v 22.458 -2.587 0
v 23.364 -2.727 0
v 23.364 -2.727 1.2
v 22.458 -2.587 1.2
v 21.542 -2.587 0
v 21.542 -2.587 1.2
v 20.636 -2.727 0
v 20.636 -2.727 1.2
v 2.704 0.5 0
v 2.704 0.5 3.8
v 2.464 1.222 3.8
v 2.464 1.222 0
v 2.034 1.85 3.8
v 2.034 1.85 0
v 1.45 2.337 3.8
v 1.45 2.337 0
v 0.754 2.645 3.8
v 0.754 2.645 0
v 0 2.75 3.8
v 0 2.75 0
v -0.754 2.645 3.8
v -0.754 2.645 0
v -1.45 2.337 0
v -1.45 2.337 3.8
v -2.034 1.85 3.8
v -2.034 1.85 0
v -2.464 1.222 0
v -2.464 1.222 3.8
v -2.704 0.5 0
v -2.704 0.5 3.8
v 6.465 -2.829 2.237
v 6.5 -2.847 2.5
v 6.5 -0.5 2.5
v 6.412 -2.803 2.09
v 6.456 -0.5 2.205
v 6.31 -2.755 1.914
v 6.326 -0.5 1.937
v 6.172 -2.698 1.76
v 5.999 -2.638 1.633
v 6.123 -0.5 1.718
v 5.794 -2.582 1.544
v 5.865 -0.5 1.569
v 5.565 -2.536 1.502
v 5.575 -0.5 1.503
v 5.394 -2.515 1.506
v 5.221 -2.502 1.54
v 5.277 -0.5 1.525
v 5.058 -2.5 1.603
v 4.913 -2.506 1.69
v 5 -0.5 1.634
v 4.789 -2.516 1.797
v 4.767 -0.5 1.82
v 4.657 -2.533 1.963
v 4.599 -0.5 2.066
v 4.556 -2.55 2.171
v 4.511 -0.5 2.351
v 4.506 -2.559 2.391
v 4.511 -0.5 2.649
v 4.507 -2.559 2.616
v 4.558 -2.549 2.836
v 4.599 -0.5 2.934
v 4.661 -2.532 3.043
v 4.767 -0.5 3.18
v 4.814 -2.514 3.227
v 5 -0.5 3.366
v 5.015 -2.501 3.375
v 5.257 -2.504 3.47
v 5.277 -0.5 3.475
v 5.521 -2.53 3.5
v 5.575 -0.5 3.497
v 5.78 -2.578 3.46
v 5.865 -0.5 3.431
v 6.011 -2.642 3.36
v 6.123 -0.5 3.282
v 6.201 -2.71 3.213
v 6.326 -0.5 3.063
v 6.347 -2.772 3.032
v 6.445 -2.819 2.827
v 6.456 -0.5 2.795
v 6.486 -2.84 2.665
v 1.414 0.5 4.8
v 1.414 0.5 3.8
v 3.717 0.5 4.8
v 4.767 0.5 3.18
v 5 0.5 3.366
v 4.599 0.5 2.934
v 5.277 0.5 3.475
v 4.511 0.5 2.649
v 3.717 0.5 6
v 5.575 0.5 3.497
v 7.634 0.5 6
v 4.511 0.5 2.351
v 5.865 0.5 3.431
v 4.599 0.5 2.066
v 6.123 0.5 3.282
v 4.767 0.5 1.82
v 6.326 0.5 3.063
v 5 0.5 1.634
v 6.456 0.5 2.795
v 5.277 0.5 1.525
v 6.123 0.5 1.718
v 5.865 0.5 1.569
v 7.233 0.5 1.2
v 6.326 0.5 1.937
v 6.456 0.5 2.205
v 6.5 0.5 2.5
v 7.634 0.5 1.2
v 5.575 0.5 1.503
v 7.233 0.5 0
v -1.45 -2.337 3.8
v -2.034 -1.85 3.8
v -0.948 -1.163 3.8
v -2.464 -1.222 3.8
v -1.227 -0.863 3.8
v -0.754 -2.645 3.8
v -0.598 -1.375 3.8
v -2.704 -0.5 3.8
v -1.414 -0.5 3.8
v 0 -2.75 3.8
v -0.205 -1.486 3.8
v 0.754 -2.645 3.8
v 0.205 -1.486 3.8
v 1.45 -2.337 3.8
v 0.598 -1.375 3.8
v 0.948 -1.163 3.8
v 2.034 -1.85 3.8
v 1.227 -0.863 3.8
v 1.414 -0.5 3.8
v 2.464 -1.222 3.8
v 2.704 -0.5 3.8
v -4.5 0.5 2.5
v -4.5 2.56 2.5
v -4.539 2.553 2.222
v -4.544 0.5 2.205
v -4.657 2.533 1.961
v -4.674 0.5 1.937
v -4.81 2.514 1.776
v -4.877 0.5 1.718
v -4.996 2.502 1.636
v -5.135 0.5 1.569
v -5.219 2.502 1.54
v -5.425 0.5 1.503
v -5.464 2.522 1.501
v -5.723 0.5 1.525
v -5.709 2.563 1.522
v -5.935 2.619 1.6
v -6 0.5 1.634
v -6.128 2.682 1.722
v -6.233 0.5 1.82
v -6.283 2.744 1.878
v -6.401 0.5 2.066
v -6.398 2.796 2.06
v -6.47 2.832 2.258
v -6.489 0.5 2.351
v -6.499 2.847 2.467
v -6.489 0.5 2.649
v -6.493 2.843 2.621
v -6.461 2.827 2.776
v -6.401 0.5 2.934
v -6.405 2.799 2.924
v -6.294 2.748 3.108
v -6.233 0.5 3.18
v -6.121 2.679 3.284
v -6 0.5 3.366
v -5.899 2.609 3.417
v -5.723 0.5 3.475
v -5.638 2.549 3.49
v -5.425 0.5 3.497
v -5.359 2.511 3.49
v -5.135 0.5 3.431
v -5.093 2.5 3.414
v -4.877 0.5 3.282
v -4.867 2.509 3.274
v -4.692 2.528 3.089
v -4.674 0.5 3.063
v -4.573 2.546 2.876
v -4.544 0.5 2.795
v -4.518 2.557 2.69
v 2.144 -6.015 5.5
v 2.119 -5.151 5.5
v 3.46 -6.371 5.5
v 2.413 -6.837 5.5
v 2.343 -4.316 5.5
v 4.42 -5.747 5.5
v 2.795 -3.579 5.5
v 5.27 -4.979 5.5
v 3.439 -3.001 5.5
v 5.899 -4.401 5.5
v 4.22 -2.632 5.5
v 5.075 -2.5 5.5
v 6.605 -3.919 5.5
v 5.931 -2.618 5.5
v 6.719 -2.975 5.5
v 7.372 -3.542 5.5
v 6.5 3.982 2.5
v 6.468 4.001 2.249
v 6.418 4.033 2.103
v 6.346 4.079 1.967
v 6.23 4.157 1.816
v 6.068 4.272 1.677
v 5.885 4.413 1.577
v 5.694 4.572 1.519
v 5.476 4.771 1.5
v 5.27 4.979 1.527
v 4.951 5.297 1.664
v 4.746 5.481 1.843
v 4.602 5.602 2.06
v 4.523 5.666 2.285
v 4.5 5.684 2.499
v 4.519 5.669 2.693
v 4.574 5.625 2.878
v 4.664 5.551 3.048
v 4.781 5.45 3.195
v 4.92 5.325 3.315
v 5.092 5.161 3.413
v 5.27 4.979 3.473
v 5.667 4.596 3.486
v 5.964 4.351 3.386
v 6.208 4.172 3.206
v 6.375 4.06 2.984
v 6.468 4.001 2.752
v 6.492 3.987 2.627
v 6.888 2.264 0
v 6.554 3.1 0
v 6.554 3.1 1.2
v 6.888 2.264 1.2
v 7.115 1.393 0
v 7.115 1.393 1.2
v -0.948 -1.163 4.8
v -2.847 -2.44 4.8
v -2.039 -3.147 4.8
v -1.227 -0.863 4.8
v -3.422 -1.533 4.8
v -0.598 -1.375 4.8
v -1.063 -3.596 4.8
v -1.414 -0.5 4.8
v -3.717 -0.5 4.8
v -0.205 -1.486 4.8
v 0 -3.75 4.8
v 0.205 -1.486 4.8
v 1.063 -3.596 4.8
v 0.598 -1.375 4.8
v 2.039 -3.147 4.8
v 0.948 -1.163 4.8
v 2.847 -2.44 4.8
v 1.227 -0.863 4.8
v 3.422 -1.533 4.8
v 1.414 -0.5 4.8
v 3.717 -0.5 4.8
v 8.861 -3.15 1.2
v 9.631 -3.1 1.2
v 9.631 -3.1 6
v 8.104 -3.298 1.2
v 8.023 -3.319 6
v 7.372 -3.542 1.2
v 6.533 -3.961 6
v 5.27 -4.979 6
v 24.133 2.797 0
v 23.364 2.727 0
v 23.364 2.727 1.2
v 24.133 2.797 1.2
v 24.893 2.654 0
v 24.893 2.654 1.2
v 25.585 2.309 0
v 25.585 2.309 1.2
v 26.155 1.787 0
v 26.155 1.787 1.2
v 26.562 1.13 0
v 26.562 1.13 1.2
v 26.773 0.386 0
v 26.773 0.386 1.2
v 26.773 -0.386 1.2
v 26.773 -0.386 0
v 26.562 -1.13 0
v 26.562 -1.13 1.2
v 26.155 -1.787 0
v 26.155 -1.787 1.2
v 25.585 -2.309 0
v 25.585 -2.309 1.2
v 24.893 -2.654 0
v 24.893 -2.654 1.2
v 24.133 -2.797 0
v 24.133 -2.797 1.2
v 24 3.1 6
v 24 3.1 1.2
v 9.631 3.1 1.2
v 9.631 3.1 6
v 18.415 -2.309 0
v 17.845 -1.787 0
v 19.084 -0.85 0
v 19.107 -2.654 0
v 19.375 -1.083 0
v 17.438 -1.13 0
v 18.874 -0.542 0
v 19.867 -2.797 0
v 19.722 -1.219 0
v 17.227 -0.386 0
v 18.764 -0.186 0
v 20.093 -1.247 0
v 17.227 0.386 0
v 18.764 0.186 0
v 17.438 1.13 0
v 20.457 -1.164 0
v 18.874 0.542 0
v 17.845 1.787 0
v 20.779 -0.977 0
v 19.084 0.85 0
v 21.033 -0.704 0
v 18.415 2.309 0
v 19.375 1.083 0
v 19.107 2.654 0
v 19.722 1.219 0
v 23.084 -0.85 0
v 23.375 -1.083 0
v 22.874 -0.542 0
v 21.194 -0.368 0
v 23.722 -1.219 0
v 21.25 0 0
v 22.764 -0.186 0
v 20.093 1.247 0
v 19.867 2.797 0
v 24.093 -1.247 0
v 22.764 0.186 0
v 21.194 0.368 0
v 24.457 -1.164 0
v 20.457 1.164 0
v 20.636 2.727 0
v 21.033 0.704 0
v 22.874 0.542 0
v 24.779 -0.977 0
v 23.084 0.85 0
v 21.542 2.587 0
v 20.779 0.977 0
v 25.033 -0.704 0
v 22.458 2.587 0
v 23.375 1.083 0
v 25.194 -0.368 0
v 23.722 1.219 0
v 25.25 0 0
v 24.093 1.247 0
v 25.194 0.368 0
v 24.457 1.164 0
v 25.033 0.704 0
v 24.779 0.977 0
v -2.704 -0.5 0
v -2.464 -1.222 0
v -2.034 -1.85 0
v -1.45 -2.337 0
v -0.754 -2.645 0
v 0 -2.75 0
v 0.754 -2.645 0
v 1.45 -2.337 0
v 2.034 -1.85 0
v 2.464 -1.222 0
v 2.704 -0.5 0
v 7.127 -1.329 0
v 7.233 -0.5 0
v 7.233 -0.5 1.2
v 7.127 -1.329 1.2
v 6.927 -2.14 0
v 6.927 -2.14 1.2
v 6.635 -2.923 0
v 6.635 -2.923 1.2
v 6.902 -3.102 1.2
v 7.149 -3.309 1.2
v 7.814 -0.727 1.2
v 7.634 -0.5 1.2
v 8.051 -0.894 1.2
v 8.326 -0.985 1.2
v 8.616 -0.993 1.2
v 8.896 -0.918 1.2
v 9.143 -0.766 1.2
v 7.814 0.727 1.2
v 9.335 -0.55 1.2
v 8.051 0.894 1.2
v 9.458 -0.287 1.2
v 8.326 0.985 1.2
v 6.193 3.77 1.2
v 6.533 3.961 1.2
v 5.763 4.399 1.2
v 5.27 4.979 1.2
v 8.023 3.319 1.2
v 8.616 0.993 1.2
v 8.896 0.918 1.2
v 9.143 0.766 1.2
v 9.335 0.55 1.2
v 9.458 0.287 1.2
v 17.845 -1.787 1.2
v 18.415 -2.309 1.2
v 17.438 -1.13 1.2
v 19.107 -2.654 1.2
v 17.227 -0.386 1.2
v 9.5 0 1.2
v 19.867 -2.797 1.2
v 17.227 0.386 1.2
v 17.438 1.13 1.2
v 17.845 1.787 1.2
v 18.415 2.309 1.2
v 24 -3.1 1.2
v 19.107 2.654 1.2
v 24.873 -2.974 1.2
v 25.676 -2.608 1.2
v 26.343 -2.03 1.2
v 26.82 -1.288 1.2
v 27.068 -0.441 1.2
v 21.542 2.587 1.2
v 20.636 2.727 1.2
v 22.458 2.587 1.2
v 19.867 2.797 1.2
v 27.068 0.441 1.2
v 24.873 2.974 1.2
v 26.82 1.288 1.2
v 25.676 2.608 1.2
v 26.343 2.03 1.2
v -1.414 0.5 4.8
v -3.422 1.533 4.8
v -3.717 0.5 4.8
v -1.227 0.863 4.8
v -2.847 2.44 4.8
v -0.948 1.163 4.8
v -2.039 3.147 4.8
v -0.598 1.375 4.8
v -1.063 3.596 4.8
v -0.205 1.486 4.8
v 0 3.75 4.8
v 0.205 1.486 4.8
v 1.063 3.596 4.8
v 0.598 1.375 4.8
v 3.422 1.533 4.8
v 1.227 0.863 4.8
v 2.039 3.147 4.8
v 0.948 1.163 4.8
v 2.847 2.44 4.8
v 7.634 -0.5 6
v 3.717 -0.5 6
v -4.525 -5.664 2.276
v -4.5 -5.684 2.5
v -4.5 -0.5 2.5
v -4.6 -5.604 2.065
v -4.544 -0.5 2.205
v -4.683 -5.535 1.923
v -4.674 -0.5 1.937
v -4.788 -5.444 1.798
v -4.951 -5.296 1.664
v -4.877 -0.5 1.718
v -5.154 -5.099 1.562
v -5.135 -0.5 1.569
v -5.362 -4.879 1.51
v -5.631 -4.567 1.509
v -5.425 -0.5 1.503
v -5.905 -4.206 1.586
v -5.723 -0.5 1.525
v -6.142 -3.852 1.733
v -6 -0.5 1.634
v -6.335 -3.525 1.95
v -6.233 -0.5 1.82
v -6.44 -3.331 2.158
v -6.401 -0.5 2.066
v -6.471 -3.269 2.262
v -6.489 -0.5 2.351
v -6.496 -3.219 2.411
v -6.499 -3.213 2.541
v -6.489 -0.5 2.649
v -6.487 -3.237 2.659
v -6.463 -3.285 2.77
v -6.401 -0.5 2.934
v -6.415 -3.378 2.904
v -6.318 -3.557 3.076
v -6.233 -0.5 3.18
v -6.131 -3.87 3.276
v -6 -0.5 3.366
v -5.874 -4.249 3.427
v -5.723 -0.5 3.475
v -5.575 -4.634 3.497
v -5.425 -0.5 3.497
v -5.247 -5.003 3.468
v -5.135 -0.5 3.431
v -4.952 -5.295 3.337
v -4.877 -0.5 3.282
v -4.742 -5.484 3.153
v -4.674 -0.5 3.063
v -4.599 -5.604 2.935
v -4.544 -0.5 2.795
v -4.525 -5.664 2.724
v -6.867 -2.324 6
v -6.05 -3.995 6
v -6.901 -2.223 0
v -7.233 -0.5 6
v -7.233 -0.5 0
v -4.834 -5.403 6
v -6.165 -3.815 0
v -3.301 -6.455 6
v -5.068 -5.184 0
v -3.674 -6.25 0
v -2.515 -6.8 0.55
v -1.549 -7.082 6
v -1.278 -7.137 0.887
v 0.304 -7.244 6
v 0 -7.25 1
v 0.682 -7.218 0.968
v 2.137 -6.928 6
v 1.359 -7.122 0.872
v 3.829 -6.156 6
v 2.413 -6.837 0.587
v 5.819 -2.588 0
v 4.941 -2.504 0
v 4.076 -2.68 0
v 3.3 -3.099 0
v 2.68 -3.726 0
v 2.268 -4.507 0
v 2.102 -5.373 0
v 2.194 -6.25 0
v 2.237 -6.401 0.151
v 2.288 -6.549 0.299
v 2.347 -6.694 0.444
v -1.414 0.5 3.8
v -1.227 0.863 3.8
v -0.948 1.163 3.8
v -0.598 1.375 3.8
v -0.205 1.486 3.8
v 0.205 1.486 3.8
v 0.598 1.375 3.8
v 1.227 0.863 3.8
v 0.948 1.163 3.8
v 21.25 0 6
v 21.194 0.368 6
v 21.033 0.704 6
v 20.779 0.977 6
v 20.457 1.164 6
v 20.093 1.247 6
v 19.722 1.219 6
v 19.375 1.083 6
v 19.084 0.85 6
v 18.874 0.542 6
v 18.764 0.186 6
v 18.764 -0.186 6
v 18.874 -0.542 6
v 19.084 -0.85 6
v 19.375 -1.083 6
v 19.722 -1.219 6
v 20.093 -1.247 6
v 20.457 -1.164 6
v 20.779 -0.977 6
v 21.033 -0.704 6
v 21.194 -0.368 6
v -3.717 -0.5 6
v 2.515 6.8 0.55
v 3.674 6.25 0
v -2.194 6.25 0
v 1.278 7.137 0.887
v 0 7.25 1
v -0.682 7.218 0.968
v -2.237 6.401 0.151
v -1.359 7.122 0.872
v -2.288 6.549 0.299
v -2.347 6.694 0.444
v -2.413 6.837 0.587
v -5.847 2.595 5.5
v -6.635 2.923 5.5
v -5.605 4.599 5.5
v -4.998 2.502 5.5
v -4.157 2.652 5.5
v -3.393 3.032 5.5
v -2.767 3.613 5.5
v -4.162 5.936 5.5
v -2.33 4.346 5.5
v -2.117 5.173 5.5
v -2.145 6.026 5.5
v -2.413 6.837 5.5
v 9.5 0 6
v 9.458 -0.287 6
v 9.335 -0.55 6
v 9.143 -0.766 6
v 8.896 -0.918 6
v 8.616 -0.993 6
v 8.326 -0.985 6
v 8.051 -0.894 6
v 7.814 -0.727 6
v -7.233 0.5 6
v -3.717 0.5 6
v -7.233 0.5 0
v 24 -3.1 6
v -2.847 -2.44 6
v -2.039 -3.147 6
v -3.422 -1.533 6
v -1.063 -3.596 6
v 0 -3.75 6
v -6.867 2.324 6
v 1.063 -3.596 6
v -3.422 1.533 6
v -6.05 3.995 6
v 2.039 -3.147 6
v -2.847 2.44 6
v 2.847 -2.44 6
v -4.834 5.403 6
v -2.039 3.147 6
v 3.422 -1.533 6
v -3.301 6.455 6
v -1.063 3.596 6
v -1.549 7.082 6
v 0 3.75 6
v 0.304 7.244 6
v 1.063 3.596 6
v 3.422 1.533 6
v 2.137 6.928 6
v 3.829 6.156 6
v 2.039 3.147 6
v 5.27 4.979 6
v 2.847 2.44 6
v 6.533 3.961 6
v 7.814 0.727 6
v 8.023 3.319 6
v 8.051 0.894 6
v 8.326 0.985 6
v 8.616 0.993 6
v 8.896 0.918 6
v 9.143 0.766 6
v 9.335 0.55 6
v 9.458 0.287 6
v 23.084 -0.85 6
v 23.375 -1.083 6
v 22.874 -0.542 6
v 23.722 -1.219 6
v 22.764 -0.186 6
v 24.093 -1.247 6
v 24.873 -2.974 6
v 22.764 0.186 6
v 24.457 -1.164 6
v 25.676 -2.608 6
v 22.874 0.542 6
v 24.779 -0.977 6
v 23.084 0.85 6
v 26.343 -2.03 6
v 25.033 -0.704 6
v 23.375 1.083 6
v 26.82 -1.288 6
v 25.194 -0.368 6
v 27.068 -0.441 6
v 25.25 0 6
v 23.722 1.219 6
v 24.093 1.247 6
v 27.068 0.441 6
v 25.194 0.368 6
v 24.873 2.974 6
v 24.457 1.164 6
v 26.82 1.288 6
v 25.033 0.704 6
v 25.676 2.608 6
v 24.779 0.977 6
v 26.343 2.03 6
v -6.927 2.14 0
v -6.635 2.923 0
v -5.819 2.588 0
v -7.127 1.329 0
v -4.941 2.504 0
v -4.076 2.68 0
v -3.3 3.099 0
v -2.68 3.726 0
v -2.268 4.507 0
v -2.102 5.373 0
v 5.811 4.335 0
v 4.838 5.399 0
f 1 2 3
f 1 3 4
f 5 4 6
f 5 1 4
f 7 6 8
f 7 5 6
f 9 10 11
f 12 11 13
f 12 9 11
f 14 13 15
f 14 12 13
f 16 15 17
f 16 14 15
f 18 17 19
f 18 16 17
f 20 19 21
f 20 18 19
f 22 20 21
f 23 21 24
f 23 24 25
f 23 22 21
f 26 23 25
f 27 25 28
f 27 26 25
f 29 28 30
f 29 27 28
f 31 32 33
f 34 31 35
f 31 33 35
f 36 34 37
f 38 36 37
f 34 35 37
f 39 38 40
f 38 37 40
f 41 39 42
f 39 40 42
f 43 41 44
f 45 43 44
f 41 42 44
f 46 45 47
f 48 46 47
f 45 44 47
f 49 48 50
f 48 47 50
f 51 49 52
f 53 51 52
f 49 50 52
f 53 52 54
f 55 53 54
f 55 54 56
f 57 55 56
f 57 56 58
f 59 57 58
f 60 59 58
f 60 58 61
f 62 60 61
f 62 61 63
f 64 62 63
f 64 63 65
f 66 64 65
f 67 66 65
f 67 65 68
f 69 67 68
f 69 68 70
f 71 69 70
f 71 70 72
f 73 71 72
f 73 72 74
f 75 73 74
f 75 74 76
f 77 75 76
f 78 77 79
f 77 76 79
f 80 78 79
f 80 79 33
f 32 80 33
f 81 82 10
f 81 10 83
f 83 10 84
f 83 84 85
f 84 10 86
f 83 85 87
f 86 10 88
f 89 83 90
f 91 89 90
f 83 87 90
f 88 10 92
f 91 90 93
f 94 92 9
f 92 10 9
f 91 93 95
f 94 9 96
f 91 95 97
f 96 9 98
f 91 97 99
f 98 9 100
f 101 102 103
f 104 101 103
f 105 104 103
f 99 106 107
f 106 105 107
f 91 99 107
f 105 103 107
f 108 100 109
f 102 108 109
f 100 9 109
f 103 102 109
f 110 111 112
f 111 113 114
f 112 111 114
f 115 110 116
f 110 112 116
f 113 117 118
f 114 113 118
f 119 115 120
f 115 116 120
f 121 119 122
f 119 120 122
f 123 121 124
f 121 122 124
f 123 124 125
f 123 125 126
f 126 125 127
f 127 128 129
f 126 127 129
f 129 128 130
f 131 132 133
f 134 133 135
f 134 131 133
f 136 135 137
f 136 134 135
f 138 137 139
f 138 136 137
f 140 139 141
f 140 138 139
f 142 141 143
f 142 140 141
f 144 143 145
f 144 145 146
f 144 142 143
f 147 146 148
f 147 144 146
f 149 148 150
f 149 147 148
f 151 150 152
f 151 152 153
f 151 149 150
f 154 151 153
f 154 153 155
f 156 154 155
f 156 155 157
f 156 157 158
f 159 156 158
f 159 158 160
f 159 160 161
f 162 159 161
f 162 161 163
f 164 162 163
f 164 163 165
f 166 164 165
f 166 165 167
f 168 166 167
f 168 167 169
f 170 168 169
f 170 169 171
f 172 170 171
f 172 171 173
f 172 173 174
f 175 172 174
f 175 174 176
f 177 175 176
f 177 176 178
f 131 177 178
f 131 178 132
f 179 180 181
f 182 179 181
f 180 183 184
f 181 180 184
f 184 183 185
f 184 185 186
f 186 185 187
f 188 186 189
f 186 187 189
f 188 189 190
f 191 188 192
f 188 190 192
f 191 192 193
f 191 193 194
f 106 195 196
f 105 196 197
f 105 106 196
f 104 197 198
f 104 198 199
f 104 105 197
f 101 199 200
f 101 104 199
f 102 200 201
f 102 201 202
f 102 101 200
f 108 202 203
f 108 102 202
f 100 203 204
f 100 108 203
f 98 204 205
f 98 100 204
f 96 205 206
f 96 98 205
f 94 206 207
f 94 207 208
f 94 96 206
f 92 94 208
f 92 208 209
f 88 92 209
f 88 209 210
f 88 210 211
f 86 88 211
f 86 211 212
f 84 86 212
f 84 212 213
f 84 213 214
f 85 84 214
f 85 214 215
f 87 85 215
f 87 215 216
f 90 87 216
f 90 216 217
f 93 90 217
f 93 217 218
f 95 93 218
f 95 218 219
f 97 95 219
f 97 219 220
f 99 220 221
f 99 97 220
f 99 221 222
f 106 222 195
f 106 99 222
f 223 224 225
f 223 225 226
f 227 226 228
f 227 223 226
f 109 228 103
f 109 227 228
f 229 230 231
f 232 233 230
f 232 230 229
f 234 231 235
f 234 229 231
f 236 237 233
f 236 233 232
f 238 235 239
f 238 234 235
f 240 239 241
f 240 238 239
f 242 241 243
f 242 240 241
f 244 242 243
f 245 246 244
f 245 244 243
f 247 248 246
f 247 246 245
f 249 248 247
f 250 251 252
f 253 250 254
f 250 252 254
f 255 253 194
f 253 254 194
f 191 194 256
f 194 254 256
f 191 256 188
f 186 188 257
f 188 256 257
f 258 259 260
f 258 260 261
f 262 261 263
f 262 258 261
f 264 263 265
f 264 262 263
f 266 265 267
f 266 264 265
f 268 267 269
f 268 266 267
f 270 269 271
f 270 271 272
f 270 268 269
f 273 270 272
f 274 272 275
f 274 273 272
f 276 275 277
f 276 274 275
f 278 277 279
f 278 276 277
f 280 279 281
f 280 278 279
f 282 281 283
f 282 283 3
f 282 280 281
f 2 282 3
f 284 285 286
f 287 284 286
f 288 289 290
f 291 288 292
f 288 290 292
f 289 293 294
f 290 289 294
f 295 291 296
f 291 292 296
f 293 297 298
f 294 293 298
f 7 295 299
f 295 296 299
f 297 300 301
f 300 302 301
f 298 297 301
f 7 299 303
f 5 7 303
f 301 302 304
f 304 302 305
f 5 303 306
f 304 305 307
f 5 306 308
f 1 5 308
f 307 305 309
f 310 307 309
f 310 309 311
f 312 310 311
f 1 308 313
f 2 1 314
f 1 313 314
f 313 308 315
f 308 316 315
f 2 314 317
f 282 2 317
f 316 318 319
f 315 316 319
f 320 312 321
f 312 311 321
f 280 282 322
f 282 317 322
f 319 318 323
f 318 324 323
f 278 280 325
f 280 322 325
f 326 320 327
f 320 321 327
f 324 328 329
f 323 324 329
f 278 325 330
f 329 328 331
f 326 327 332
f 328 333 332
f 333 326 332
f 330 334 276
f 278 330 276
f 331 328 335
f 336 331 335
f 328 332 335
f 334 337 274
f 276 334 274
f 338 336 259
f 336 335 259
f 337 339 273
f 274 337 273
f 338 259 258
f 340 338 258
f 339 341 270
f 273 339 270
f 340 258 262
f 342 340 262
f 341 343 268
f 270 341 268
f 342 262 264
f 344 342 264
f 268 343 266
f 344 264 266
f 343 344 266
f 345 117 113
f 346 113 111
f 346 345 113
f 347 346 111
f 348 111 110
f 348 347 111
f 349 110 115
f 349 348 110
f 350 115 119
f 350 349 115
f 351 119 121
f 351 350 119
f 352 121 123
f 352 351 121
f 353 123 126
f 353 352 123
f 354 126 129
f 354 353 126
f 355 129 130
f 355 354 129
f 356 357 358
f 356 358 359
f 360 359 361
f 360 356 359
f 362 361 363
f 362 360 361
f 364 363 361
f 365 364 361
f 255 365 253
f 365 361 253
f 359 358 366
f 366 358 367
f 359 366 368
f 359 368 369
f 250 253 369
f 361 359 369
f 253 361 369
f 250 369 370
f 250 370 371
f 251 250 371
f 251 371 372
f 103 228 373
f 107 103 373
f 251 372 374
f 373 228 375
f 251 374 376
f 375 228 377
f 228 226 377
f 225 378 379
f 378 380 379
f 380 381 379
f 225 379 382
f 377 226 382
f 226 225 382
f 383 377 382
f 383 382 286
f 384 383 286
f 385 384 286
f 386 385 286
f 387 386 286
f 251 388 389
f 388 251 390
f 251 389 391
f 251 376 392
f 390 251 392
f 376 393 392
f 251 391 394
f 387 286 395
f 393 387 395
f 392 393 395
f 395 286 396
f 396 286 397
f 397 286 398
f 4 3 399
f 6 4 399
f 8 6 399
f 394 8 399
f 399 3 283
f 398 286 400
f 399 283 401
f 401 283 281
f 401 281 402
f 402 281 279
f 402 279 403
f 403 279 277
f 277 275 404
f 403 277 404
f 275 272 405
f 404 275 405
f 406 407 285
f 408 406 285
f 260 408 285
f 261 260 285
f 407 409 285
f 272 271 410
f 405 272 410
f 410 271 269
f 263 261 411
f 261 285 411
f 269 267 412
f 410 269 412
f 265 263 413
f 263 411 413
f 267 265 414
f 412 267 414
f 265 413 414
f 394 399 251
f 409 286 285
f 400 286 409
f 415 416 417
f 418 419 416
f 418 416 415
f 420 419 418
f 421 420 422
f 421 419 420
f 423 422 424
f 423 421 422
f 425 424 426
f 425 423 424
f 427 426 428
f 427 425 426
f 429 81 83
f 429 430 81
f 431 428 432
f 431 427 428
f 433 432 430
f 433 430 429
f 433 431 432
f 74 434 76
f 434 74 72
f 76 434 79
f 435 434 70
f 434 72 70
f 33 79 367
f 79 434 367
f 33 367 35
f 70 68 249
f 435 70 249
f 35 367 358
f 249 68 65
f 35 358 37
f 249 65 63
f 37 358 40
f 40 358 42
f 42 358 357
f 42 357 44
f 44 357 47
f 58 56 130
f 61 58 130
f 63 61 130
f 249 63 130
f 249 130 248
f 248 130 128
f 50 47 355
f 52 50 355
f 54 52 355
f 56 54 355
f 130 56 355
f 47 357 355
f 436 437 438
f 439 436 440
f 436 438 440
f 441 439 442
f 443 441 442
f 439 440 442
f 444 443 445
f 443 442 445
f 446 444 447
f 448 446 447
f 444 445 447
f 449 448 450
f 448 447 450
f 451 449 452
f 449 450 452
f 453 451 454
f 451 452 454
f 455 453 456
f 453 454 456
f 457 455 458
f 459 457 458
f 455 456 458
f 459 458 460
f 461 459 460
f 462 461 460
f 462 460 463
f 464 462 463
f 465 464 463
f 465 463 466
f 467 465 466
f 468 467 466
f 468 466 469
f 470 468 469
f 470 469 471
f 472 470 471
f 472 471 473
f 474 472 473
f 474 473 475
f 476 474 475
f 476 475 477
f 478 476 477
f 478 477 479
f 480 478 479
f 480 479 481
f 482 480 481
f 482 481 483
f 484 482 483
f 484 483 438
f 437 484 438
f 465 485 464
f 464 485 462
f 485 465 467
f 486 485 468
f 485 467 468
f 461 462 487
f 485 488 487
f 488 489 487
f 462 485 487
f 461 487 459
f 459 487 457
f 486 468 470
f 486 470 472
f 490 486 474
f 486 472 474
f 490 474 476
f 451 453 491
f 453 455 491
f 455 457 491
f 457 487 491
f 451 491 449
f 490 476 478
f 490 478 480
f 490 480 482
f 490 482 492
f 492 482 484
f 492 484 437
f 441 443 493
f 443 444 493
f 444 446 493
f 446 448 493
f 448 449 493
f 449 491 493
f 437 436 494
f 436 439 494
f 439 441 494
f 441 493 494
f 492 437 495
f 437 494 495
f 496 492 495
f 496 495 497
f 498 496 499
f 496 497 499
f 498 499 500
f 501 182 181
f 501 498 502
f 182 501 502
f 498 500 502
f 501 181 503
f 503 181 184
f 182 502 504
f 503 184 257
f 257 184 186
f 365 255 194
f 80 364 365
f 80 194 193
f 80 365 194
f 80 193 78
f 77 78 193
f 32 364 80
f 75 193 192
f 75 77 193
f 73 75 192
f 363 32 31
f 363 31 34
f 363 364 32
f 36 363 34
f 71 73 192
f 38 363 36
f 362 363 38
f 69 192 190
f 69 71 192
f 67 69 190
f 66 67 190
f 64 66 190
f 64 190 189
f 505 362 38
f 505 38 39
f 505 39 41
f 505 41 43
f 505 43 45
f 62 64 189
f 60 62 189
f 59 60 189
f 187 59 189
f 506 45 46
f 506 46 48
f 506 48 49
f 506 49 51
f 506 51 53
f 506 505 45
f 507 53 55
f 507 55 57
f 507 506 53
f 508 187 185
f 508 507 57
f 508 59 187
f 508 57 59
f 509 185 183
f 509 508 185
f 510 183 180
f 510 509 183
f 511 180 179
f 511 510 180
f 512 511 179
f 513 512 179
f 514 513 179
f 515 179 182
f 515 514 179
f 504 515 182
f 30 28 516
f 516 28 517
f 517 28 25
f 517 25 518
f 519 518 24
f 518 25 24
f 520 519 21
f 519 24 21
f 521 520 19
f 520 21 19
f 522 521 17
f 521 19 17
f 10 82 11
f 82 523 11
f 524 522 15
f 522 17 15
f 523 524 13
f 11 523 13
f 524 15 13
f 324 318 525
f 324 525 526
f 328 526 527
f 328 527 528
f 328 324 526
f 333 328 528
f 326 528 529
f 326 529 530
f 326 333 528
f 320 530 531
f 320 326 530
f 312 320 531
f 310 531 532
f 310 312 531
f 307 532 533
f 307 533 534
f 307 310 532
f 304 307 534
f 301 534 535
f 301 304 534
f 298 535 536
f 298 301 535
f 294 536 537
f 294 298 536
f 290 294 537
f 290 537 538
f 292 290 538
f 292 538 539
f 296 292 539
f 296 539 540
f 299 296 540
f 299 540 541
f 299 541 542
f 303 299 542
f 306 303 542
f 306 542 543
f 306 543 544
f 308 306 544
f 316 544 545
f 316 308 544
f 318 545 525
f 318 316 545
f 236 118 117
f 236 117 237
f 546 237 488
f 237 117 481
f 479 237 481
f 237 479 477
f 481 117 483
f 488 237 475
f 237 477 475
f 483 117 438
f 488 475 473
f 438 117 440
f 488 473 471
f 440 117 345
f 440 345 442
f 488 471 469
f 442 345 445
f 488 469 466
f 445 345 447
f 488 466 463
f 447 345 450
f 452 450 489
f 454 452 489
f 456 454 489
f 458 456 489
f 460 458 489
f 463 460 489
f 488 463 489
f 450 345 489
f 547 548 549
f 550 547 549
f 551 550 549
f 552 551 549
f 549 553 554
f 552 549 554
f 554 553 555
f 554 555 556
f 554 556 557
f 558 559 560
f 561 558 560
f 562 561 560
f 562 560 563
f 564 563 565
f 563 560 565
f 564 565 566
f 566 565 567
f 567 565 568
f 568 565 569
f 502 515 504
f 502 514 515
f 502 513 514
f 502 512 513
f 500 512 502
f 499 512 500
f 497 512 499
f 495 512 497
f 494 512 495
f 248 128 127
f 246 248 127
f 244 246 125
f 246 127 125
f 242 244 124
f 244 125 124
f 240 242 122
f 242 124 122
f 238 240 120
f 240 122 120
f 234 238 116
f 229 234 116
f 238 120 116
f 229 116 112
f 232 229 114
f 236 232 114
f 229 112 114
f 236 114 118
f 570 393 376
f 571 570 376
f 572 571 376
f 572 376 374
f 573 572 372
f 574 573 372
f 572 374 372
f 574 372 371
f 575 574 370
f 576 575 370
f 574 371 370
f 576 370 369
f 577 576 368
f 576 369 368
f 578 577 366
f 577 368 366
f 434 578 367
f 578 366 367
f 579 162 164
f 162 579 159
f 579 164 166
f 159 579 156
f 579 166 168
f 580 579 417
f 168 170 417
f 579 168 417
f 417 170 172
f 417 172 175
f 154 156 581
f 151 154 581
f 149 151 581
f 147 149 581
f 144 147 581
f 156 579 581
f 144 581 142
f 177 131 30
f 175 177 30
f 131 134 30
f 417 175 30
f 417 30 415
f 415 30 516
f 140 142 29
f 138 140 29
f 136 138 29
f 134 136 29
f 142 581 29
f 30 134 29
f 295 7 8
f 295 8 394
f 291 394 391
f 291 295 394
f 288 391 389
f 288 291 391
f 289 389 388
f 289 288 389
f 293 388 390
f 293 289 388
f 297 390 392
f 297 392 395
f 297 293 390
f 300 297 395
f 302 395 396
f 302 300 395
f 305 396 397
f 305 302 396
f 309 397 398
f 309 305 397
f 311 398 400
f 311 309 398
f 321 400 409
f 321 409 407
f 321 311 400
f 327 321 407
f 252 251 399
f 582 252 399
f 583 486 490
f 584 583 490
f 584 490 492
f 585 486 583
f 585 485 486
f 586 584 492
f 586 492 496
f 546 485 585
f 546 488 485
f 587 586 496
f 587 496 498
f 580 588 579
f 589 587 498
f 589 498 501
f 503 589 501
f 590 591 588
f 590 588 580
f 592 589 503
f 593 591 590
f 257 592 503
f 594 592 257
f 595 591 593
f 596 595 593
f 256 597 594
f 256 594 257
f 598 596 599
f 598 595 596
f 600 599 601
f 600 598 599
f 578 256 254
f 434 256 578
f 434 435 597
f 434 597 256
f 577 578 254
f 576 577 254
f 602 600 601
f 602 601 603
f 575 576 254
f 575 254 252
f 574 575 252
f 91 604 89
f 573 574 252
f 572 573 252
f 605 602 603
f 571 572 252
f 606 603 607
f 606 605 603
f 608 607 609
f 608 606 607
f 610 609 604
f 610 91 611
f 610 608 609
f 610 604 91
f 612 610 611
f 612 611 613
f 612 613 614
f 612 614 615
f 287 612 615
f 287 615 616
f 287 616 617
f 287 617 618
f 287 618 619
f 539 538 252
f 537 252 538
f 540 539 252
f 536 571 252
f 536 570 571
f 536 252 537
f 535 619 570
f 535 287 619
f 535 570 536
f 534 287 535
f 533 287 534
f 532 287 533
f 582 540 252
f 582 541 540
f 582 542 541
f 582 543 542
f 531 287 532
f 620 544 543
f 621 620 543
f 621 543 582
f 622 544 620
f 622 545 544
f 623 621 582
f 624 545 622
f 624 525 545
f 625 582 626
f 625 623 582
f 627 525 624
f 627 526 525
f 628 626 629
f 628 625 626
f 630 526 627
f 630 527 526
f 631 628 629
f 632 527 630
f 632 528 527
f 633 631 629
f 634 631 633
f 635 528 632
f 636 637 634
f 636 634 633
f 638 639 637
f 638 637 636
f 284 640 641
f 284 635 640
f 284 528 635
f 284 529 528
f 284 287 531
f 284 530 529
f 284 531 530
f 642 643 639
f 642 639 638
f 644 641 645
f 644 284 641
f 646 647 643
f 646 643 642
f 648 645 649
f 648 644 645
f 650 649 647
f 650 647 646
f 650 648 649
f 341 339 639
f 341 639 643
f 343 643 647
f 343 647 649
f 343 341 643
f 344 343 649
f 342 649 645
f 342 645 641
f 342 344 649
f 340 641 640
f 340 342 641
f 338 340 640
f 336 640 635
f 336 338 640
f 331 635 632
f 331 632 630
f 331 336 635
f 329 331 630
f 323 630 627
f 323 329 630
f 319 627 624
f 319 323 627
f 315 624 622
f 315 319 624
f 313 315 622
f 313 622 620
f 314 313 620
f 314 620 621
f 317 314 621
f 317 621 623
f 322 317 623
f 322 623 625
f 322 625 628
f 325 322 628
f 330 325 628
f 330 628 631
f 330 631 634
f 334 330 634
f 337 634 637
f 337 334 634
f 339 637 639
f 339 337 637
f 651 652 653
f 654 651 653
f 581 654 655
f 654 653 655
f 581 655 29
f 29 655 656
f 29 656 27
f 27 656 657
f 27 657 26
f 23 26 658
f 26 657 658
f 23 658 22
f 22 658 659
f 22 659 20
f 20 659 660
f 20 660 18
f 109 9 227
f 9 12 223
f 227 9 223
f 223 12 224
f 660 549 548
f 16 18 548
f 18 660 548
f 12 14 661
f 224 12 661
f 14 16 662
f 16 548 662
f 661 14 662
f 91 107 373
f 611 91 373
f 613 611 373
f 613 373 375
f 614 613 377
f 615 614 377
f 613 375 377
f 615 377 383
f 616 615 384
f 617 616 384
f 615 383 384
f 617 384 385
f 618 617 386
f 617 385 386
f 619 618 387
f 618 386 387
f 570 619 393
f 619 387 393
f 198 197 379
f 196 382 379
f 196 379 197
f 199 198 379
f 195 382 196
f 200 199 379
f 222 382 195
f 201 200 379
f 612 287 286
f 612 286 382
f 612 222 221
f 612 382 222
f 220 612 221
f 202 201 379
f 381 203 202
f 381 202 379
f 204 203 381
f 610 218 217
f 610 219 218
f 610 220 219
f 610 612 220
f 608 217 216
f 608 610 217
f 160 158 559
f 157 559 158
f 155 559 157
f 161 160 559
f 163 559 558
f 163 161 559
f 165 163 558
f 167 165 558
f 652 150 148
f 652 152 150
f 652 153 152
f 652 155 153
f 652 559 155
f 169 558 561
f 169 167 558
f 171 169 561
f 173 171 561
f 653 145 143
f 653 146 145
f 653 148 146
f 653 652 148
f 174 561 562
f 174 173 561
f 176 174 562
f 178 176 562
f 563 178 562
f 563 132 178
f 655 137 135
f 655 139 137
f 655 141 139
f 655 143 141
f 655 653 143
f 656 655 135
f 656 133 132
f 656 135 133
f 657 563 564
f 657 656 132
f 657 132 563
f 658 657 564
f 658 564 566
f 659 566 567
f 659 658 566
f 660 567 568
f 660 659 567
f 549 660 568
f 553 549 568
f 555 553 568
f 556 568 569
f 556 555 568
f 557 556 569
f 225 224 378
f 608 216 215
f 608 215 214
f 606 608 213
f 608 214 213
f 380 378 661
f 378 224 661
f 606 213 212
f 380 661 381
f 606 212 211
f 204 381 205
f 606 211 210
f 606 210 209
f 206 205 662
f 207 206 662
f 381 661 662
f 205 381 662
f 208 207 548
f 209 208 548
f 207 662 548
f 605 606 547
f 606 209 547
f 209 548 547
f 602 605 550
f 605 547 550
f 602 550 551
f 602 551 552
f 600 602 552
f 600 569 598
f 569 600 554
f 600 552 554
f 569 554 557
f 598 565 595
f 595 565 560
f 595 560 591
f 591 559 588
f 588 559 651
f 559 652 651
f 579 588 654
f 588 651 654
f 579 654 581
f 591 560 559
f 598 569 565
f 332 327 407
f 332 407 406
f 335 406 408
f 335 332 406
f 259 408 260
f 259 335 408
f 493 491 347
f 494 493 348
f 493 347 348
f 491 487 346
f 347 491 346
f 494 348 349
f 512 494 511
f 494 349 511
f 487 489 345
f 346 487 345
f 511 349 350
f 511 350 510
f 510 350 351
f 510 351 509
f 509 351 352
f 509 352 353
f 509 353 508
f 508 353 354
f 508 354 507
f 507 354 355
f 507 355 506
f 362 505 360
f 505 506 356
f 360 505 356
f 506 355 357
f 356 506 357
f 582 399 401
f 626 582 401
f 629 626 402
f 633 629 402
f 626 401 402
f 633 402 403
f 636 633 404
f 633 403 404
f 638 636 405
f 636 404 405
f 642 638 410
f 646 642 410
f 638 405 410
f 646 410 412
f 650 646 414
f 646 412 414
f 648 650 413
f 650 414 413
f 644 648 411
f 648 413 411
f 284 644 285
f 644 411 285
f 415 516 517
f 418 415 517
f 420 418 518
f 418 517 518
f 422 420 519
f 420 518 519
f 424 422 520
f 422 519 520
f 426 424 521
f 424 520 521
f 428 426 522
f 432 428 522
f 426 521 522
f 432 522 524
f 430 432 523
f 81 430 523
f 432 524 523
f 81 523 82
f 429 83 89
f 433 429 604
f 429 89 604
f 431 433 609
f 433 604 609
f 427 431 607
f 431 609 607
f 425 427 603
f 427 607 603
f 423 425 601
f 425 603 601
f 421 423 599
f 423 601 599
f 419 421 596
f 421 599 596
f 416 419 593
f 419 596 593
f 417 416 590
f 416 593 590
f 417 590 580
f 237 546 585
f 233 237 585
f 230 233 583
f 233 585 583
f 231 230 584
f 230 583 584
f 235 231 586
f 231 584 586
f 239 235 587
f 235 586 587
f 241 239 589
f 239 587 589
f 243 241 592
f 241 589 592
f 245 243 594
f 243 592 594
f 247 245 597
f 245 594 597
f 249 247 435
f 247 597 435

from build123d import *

# Parameters (mm, degrees)
SKETCH_1_R               = 1.25
EXTRUDE_1_DEPTH          = 6
CUT_EXTRUDE_1_DEPTH      = 1.2
SKETCH_1_4_R             = 2.75
CUT_EXTRUDE_2_DEPTH      = 3.8
CUT_EXTRUDE_START        = 6
SKETCH_1_5_R             = 3.75
CUT_EXTRUDE_3_DEPTH      = 1.2
FILLET_1_R               = 6
SKETCH_2_R               = 3
CUT_EXTRUDE_4_DEPTH      = 5.5
SKETCH_3_R               = 1
CUT_EXTRUDE_5_DEPTH      = 8.25
CUT_EXTRUDE_5_DEPTH_BACK = 8.25
CUT_EXTRUDE_6_DEPTH      = 28.1
CUT_EXTRUDE_6_DEPTH_BACK = 8.232738171


with BuildPart() as part:
    # Эскиз1 → Бобышка-Вытянуть1 (new body)
    with BuildSketch(Plane.XY):
        with BuildLine():
            ThreePointArc((24, -3.1), (27.1, 0), (24, 3.1))
            Line((24, 3.1), (6.553815682, 3.1))
            ThreePointArc((6.553815682, 3.1), (7.014789099, 1.831729757), (7.232738071, 0.5))
            Line((7.232738071, 0.5), (7.633974596, 0.5))
            ThreePointArc((7.633974596, 0.5), (8.758819045, 0.965925826), (9.5, 0))
            ThreePointArc((9.5, 0), (8.758819045, -0.965925826), (7.633974596, -0.5))
            Line((7.633974596, -0.5), (7.232738071, -0.5))
            ThreePointArc((7.232738071, -0.5), (7.014789099, -1.831729757), (6.553815682, -3.1))
            Line((6.553815682, -3.1), (24, -3.1))
        make_face()
        with BuildLine():
            ThreePointArc((23.363636364, 2.726727218), (26.8, 0), (23.363636364, -2.726727218))
            ThreePointArc((23.363636364, -2.726727218), (22, -2.569714114), (20.636363636, -2.726727218))
            ThreePointArc((20.636363636, -2.726727218), (17.2, 0), (20.636363636, 2.726727218))
            ThreePointArc((20.636363636, 2.726727218), (22, 2.569714114), (23.363636364, 2.726727218))
        make_face(mode=Mode.SUBTRACT)
        with BuildLine():
            ThreePointArc((20.636363636, 2.726727218), (22, 2.569714114), (23.363636364, 2.726727218))
            ThreePointArc((23.363636364, 2.726727218), (26.8, 0), (23.363636364, -2.726727218))
            ThreePointArc((23.363636364, -2.726727218), (22, -2.569714114), (20.636363636, -2.726727218))
            ThreePointArc((20.636363636, -2.726727218), (17.2, 0), (20.636363636, 2.726727218))
        make_face()
        with Locations((20, 0)):
            Circle(SKETCH_1_R, mode=Mode.SUBTRACT)
        with Locations((24, 0)):
            Circle(SKETCH_1_R, mode=Mode.SUBTRACT)
        with BuildLine():
            ThreePointArc((7.232738071, 0.5), (7.014789099, 1.831729757), (6.553815682, 3.1))
            ThreePointArc((6.553815682, 3.1), (-1.343589931, 7.124413386), (-7.232738071, 0.5))
            Line((-7.232738071, 0.5), (-3.716517187, 0.5))
            ThreePointArc((-3.716517187, 0.5), (0, 3.75), (3.716517187, 0.5))
            Line((3.716517187, 0.5), (7.232738071, 0.5))
        make_face()
        with BuildLine():
            ThreePointArc((3.716517187, 0.5), (0, 3.75), (-3.716517187, 0.5))
            Line((-3.716517187, 0.5), (-2.704163457, 0.5))
            ThreePointArc((-2.704163457, 0.5), (0, 2.75), (2.704163457, 0.5))
            Line((2.704163457, 0.5), (3.716517187, 0.5))
        make_face()
        with BuildLine():
            ThreePointArc((2.704163457, 0.5), (0, 2.75), (-2.704163457, 0.5))
            Line((-2.704163457, 0.5), (-1.414213562, 0.5))
            ThreePointArc((-1.414213562, 0.5), (0, 1.5), (1.414213562, 0.5))
            Line((1.414213562, 0.5), (2.704163457, 0.5))
        make_face()
        with BuildLine():
            ThreePointArc((-7.232738071, -0.5), (-1.343589931, -7.124413386), (6.553815682, -3.1))
            ThreePointArc((6.553815682, -3.1), (7.014789099, -1.831729757), (7.232738071, -0.5))
            Line((7.232738071, -0.5), (3.716517187, -0.5))
            ThreePointArc((3.716517187, -0.5), (0, -3.75), (-3.716517187, -0.5))
            Line((-3.716517187, -0.5), (-7.232738071, -0.5))
        make_face()
        with BuildLine():
            Line((-2.704163457, -0.5), (-3.716517187, -0.5))
            ThreePointArc((-3.716517187, -0.5), (0, -3.75), (3.716517187, -0.5))
            Line((3.716517187, -0.5), (2.704163457, -0.5))
            ThreePointArc((2.704163457, -0.5), (0, -2.75), (-2.704163457, -0.5))
        make_face()
        with BuildLine():
            Line((-1.414213562, -0.5), (-2.704163457, -0.5))
            ThreePointArc((-2.704163457, -0.5), (0, -2.75), (2.704163457, -0.5))
            Line((2.704163457, -0.5), (1.414213562, -0.5))
            ThreePointArc((1.414213562, -0.5), (0, -1.5), (-1.414213562, -0.5))
        make_face()
    extrude(amount=EXTRUDE_1_DEPTH)

    # Эскиз1<3> → Вырез-Вытянуть1 (cut)
    with BuildSketch(Plane.XY):
        with BuildLine():
            ThreePointArc((24, -3.1), (27.1, 0), (24, 3.1))
            Line((24, 3.1), (6.553815682, 3.1))
            ThreePointArc((6.553815682, 3.1), (7.014789099, 1.831729757), (7.232738071, 0.5))
            Line((7.232738071, 0.5), (7.633974596, 0.5))
            ThreePointArc((7.633974596, 0.5), (8.758819045, 0.965925826), (9.5, 0))
            ThreePointArc((9.5, 0), (8.758819045, -0.965925826), (7.633974596, -0.5))
            Line((7.633974596, -0.5), (7.232738071, -0.5))
            ThreePointArc((7.232738071, -0.5), (7.014789099, -1.831729757), (6.553815682, -3.1))
            Line((6.553815682, -3.1), (24, -3.1))
        make_face()
        with BuildLine():
            ThreePointArc((23.363636364, 2.726727218), (26.8, 0), (23.363636364, -2.726727218))
            ThreePointArc((23.363636364, -2.726727218), (22, -2.569714114), (20.636363636, -2.726727218))
            ThreePointArc((20.636363636, -2.726727218), (17.2, 0), (20.636363636, 2.726727218))
            ThreePointArc((20.636363636, 2.726727218), (22, 2.569714114), (23.363636364, 2.726727218))
        make_face(mode=Mode.SUBTRACT)
    extrude(amount=CUT_EXTRUDE_1_DEPTH, mode=Mode.SUBTRACT)

    # Эскиз1<4> → Вырез-Вытянуть2 (cut)
    with BuildSketch(Plane.XY):
        Circle(SKETCH_1_4_R)
    extrude(amount=CUT_EXTRUDE_2_DEPTH, mode=Mode.SUBTRACT)

    # Эскиз1<5> → Вырез-Вытянуть3 (cut)
    with BuildSketch(Plane.XY.offset(CUT_EXTRUDE_START)):
        Circle(SKETCH_1_5_R)
    extrude(amount=-CUT_EXTRUDE_3_DEPTH, mode=Mode.SUBTRACT)

    # Скругление1
    fillet_1_edges = [part.edges().sort_by_distance(p)[0] for p in [
        (6.553815682, 3.1, 3.6),
        (6.553815682, -3.1, 3.6),
    ]]
    fillet(fillet_1_edges, radius=FILLET_1_R)

    # Эскиз2 → Вырез-Вытянуть4 (cut)
    with BuildSketch(Plane.XY):
        with Locations((5.099019514, -5.5)):
            Circle(SKETCH_2_R)
        with Locations((-5.099019514, 5.5)):
            Circle(SKETCH_2_R)
    extrude(amount=CUT_EXTRUDE_4_DEPTH, mode=Mode.SUBTRACT)

    # Эскиз3 → Вырез-Вытянуть5 (cut, two sides)
    with BuildSketch(Plane(origin=(0, 0, 0), x_dir=(1, 0, 0), z_dir=(0, 1, 0))) as cut_extrude_5_sk:
        with Locations((5.5, -2.5)):
            Circle(SKETCH_3_R)
        with Locations((-5.5, -2.5)):
            Circle(SKETCH_3_R)
    extrude(amount=CUT_EXTRUDE_5_DEPTH, mode=Mode.SUBTRACT)
    extrude(cut_extrude_5_sk.sketch, amount=-CUT_EXTRUDE_5_DEPTH_BACK, mode=Mode.SUBTRACT)

    # Эскиз4 → Вырез-Вытянуть6 (cut, two sides)
    with BuildSketch(Plane(origin=(0, 0, 0), x_dir=(0, 0, -1), z_dir=(1, 0, 0))) as cut_extrude_6_sk:
        Polygon((0, -6.25), (-1, -7.25), (0, -7.25), align=None)
        Polygon((0, 7.25), (0, 6.25), (-1, 7.25), align=None)
    extrude(amount=CUT_EXTRUDE_6_DEPTH, mode=Mode.SUBTRACT)
    extrude(cut_extrude_6_sk.sketch, amount=-CUT_EXTRUDE_6_DEPTH_BACK, mode=Mode.SUBTRACT)


solid = part.part
